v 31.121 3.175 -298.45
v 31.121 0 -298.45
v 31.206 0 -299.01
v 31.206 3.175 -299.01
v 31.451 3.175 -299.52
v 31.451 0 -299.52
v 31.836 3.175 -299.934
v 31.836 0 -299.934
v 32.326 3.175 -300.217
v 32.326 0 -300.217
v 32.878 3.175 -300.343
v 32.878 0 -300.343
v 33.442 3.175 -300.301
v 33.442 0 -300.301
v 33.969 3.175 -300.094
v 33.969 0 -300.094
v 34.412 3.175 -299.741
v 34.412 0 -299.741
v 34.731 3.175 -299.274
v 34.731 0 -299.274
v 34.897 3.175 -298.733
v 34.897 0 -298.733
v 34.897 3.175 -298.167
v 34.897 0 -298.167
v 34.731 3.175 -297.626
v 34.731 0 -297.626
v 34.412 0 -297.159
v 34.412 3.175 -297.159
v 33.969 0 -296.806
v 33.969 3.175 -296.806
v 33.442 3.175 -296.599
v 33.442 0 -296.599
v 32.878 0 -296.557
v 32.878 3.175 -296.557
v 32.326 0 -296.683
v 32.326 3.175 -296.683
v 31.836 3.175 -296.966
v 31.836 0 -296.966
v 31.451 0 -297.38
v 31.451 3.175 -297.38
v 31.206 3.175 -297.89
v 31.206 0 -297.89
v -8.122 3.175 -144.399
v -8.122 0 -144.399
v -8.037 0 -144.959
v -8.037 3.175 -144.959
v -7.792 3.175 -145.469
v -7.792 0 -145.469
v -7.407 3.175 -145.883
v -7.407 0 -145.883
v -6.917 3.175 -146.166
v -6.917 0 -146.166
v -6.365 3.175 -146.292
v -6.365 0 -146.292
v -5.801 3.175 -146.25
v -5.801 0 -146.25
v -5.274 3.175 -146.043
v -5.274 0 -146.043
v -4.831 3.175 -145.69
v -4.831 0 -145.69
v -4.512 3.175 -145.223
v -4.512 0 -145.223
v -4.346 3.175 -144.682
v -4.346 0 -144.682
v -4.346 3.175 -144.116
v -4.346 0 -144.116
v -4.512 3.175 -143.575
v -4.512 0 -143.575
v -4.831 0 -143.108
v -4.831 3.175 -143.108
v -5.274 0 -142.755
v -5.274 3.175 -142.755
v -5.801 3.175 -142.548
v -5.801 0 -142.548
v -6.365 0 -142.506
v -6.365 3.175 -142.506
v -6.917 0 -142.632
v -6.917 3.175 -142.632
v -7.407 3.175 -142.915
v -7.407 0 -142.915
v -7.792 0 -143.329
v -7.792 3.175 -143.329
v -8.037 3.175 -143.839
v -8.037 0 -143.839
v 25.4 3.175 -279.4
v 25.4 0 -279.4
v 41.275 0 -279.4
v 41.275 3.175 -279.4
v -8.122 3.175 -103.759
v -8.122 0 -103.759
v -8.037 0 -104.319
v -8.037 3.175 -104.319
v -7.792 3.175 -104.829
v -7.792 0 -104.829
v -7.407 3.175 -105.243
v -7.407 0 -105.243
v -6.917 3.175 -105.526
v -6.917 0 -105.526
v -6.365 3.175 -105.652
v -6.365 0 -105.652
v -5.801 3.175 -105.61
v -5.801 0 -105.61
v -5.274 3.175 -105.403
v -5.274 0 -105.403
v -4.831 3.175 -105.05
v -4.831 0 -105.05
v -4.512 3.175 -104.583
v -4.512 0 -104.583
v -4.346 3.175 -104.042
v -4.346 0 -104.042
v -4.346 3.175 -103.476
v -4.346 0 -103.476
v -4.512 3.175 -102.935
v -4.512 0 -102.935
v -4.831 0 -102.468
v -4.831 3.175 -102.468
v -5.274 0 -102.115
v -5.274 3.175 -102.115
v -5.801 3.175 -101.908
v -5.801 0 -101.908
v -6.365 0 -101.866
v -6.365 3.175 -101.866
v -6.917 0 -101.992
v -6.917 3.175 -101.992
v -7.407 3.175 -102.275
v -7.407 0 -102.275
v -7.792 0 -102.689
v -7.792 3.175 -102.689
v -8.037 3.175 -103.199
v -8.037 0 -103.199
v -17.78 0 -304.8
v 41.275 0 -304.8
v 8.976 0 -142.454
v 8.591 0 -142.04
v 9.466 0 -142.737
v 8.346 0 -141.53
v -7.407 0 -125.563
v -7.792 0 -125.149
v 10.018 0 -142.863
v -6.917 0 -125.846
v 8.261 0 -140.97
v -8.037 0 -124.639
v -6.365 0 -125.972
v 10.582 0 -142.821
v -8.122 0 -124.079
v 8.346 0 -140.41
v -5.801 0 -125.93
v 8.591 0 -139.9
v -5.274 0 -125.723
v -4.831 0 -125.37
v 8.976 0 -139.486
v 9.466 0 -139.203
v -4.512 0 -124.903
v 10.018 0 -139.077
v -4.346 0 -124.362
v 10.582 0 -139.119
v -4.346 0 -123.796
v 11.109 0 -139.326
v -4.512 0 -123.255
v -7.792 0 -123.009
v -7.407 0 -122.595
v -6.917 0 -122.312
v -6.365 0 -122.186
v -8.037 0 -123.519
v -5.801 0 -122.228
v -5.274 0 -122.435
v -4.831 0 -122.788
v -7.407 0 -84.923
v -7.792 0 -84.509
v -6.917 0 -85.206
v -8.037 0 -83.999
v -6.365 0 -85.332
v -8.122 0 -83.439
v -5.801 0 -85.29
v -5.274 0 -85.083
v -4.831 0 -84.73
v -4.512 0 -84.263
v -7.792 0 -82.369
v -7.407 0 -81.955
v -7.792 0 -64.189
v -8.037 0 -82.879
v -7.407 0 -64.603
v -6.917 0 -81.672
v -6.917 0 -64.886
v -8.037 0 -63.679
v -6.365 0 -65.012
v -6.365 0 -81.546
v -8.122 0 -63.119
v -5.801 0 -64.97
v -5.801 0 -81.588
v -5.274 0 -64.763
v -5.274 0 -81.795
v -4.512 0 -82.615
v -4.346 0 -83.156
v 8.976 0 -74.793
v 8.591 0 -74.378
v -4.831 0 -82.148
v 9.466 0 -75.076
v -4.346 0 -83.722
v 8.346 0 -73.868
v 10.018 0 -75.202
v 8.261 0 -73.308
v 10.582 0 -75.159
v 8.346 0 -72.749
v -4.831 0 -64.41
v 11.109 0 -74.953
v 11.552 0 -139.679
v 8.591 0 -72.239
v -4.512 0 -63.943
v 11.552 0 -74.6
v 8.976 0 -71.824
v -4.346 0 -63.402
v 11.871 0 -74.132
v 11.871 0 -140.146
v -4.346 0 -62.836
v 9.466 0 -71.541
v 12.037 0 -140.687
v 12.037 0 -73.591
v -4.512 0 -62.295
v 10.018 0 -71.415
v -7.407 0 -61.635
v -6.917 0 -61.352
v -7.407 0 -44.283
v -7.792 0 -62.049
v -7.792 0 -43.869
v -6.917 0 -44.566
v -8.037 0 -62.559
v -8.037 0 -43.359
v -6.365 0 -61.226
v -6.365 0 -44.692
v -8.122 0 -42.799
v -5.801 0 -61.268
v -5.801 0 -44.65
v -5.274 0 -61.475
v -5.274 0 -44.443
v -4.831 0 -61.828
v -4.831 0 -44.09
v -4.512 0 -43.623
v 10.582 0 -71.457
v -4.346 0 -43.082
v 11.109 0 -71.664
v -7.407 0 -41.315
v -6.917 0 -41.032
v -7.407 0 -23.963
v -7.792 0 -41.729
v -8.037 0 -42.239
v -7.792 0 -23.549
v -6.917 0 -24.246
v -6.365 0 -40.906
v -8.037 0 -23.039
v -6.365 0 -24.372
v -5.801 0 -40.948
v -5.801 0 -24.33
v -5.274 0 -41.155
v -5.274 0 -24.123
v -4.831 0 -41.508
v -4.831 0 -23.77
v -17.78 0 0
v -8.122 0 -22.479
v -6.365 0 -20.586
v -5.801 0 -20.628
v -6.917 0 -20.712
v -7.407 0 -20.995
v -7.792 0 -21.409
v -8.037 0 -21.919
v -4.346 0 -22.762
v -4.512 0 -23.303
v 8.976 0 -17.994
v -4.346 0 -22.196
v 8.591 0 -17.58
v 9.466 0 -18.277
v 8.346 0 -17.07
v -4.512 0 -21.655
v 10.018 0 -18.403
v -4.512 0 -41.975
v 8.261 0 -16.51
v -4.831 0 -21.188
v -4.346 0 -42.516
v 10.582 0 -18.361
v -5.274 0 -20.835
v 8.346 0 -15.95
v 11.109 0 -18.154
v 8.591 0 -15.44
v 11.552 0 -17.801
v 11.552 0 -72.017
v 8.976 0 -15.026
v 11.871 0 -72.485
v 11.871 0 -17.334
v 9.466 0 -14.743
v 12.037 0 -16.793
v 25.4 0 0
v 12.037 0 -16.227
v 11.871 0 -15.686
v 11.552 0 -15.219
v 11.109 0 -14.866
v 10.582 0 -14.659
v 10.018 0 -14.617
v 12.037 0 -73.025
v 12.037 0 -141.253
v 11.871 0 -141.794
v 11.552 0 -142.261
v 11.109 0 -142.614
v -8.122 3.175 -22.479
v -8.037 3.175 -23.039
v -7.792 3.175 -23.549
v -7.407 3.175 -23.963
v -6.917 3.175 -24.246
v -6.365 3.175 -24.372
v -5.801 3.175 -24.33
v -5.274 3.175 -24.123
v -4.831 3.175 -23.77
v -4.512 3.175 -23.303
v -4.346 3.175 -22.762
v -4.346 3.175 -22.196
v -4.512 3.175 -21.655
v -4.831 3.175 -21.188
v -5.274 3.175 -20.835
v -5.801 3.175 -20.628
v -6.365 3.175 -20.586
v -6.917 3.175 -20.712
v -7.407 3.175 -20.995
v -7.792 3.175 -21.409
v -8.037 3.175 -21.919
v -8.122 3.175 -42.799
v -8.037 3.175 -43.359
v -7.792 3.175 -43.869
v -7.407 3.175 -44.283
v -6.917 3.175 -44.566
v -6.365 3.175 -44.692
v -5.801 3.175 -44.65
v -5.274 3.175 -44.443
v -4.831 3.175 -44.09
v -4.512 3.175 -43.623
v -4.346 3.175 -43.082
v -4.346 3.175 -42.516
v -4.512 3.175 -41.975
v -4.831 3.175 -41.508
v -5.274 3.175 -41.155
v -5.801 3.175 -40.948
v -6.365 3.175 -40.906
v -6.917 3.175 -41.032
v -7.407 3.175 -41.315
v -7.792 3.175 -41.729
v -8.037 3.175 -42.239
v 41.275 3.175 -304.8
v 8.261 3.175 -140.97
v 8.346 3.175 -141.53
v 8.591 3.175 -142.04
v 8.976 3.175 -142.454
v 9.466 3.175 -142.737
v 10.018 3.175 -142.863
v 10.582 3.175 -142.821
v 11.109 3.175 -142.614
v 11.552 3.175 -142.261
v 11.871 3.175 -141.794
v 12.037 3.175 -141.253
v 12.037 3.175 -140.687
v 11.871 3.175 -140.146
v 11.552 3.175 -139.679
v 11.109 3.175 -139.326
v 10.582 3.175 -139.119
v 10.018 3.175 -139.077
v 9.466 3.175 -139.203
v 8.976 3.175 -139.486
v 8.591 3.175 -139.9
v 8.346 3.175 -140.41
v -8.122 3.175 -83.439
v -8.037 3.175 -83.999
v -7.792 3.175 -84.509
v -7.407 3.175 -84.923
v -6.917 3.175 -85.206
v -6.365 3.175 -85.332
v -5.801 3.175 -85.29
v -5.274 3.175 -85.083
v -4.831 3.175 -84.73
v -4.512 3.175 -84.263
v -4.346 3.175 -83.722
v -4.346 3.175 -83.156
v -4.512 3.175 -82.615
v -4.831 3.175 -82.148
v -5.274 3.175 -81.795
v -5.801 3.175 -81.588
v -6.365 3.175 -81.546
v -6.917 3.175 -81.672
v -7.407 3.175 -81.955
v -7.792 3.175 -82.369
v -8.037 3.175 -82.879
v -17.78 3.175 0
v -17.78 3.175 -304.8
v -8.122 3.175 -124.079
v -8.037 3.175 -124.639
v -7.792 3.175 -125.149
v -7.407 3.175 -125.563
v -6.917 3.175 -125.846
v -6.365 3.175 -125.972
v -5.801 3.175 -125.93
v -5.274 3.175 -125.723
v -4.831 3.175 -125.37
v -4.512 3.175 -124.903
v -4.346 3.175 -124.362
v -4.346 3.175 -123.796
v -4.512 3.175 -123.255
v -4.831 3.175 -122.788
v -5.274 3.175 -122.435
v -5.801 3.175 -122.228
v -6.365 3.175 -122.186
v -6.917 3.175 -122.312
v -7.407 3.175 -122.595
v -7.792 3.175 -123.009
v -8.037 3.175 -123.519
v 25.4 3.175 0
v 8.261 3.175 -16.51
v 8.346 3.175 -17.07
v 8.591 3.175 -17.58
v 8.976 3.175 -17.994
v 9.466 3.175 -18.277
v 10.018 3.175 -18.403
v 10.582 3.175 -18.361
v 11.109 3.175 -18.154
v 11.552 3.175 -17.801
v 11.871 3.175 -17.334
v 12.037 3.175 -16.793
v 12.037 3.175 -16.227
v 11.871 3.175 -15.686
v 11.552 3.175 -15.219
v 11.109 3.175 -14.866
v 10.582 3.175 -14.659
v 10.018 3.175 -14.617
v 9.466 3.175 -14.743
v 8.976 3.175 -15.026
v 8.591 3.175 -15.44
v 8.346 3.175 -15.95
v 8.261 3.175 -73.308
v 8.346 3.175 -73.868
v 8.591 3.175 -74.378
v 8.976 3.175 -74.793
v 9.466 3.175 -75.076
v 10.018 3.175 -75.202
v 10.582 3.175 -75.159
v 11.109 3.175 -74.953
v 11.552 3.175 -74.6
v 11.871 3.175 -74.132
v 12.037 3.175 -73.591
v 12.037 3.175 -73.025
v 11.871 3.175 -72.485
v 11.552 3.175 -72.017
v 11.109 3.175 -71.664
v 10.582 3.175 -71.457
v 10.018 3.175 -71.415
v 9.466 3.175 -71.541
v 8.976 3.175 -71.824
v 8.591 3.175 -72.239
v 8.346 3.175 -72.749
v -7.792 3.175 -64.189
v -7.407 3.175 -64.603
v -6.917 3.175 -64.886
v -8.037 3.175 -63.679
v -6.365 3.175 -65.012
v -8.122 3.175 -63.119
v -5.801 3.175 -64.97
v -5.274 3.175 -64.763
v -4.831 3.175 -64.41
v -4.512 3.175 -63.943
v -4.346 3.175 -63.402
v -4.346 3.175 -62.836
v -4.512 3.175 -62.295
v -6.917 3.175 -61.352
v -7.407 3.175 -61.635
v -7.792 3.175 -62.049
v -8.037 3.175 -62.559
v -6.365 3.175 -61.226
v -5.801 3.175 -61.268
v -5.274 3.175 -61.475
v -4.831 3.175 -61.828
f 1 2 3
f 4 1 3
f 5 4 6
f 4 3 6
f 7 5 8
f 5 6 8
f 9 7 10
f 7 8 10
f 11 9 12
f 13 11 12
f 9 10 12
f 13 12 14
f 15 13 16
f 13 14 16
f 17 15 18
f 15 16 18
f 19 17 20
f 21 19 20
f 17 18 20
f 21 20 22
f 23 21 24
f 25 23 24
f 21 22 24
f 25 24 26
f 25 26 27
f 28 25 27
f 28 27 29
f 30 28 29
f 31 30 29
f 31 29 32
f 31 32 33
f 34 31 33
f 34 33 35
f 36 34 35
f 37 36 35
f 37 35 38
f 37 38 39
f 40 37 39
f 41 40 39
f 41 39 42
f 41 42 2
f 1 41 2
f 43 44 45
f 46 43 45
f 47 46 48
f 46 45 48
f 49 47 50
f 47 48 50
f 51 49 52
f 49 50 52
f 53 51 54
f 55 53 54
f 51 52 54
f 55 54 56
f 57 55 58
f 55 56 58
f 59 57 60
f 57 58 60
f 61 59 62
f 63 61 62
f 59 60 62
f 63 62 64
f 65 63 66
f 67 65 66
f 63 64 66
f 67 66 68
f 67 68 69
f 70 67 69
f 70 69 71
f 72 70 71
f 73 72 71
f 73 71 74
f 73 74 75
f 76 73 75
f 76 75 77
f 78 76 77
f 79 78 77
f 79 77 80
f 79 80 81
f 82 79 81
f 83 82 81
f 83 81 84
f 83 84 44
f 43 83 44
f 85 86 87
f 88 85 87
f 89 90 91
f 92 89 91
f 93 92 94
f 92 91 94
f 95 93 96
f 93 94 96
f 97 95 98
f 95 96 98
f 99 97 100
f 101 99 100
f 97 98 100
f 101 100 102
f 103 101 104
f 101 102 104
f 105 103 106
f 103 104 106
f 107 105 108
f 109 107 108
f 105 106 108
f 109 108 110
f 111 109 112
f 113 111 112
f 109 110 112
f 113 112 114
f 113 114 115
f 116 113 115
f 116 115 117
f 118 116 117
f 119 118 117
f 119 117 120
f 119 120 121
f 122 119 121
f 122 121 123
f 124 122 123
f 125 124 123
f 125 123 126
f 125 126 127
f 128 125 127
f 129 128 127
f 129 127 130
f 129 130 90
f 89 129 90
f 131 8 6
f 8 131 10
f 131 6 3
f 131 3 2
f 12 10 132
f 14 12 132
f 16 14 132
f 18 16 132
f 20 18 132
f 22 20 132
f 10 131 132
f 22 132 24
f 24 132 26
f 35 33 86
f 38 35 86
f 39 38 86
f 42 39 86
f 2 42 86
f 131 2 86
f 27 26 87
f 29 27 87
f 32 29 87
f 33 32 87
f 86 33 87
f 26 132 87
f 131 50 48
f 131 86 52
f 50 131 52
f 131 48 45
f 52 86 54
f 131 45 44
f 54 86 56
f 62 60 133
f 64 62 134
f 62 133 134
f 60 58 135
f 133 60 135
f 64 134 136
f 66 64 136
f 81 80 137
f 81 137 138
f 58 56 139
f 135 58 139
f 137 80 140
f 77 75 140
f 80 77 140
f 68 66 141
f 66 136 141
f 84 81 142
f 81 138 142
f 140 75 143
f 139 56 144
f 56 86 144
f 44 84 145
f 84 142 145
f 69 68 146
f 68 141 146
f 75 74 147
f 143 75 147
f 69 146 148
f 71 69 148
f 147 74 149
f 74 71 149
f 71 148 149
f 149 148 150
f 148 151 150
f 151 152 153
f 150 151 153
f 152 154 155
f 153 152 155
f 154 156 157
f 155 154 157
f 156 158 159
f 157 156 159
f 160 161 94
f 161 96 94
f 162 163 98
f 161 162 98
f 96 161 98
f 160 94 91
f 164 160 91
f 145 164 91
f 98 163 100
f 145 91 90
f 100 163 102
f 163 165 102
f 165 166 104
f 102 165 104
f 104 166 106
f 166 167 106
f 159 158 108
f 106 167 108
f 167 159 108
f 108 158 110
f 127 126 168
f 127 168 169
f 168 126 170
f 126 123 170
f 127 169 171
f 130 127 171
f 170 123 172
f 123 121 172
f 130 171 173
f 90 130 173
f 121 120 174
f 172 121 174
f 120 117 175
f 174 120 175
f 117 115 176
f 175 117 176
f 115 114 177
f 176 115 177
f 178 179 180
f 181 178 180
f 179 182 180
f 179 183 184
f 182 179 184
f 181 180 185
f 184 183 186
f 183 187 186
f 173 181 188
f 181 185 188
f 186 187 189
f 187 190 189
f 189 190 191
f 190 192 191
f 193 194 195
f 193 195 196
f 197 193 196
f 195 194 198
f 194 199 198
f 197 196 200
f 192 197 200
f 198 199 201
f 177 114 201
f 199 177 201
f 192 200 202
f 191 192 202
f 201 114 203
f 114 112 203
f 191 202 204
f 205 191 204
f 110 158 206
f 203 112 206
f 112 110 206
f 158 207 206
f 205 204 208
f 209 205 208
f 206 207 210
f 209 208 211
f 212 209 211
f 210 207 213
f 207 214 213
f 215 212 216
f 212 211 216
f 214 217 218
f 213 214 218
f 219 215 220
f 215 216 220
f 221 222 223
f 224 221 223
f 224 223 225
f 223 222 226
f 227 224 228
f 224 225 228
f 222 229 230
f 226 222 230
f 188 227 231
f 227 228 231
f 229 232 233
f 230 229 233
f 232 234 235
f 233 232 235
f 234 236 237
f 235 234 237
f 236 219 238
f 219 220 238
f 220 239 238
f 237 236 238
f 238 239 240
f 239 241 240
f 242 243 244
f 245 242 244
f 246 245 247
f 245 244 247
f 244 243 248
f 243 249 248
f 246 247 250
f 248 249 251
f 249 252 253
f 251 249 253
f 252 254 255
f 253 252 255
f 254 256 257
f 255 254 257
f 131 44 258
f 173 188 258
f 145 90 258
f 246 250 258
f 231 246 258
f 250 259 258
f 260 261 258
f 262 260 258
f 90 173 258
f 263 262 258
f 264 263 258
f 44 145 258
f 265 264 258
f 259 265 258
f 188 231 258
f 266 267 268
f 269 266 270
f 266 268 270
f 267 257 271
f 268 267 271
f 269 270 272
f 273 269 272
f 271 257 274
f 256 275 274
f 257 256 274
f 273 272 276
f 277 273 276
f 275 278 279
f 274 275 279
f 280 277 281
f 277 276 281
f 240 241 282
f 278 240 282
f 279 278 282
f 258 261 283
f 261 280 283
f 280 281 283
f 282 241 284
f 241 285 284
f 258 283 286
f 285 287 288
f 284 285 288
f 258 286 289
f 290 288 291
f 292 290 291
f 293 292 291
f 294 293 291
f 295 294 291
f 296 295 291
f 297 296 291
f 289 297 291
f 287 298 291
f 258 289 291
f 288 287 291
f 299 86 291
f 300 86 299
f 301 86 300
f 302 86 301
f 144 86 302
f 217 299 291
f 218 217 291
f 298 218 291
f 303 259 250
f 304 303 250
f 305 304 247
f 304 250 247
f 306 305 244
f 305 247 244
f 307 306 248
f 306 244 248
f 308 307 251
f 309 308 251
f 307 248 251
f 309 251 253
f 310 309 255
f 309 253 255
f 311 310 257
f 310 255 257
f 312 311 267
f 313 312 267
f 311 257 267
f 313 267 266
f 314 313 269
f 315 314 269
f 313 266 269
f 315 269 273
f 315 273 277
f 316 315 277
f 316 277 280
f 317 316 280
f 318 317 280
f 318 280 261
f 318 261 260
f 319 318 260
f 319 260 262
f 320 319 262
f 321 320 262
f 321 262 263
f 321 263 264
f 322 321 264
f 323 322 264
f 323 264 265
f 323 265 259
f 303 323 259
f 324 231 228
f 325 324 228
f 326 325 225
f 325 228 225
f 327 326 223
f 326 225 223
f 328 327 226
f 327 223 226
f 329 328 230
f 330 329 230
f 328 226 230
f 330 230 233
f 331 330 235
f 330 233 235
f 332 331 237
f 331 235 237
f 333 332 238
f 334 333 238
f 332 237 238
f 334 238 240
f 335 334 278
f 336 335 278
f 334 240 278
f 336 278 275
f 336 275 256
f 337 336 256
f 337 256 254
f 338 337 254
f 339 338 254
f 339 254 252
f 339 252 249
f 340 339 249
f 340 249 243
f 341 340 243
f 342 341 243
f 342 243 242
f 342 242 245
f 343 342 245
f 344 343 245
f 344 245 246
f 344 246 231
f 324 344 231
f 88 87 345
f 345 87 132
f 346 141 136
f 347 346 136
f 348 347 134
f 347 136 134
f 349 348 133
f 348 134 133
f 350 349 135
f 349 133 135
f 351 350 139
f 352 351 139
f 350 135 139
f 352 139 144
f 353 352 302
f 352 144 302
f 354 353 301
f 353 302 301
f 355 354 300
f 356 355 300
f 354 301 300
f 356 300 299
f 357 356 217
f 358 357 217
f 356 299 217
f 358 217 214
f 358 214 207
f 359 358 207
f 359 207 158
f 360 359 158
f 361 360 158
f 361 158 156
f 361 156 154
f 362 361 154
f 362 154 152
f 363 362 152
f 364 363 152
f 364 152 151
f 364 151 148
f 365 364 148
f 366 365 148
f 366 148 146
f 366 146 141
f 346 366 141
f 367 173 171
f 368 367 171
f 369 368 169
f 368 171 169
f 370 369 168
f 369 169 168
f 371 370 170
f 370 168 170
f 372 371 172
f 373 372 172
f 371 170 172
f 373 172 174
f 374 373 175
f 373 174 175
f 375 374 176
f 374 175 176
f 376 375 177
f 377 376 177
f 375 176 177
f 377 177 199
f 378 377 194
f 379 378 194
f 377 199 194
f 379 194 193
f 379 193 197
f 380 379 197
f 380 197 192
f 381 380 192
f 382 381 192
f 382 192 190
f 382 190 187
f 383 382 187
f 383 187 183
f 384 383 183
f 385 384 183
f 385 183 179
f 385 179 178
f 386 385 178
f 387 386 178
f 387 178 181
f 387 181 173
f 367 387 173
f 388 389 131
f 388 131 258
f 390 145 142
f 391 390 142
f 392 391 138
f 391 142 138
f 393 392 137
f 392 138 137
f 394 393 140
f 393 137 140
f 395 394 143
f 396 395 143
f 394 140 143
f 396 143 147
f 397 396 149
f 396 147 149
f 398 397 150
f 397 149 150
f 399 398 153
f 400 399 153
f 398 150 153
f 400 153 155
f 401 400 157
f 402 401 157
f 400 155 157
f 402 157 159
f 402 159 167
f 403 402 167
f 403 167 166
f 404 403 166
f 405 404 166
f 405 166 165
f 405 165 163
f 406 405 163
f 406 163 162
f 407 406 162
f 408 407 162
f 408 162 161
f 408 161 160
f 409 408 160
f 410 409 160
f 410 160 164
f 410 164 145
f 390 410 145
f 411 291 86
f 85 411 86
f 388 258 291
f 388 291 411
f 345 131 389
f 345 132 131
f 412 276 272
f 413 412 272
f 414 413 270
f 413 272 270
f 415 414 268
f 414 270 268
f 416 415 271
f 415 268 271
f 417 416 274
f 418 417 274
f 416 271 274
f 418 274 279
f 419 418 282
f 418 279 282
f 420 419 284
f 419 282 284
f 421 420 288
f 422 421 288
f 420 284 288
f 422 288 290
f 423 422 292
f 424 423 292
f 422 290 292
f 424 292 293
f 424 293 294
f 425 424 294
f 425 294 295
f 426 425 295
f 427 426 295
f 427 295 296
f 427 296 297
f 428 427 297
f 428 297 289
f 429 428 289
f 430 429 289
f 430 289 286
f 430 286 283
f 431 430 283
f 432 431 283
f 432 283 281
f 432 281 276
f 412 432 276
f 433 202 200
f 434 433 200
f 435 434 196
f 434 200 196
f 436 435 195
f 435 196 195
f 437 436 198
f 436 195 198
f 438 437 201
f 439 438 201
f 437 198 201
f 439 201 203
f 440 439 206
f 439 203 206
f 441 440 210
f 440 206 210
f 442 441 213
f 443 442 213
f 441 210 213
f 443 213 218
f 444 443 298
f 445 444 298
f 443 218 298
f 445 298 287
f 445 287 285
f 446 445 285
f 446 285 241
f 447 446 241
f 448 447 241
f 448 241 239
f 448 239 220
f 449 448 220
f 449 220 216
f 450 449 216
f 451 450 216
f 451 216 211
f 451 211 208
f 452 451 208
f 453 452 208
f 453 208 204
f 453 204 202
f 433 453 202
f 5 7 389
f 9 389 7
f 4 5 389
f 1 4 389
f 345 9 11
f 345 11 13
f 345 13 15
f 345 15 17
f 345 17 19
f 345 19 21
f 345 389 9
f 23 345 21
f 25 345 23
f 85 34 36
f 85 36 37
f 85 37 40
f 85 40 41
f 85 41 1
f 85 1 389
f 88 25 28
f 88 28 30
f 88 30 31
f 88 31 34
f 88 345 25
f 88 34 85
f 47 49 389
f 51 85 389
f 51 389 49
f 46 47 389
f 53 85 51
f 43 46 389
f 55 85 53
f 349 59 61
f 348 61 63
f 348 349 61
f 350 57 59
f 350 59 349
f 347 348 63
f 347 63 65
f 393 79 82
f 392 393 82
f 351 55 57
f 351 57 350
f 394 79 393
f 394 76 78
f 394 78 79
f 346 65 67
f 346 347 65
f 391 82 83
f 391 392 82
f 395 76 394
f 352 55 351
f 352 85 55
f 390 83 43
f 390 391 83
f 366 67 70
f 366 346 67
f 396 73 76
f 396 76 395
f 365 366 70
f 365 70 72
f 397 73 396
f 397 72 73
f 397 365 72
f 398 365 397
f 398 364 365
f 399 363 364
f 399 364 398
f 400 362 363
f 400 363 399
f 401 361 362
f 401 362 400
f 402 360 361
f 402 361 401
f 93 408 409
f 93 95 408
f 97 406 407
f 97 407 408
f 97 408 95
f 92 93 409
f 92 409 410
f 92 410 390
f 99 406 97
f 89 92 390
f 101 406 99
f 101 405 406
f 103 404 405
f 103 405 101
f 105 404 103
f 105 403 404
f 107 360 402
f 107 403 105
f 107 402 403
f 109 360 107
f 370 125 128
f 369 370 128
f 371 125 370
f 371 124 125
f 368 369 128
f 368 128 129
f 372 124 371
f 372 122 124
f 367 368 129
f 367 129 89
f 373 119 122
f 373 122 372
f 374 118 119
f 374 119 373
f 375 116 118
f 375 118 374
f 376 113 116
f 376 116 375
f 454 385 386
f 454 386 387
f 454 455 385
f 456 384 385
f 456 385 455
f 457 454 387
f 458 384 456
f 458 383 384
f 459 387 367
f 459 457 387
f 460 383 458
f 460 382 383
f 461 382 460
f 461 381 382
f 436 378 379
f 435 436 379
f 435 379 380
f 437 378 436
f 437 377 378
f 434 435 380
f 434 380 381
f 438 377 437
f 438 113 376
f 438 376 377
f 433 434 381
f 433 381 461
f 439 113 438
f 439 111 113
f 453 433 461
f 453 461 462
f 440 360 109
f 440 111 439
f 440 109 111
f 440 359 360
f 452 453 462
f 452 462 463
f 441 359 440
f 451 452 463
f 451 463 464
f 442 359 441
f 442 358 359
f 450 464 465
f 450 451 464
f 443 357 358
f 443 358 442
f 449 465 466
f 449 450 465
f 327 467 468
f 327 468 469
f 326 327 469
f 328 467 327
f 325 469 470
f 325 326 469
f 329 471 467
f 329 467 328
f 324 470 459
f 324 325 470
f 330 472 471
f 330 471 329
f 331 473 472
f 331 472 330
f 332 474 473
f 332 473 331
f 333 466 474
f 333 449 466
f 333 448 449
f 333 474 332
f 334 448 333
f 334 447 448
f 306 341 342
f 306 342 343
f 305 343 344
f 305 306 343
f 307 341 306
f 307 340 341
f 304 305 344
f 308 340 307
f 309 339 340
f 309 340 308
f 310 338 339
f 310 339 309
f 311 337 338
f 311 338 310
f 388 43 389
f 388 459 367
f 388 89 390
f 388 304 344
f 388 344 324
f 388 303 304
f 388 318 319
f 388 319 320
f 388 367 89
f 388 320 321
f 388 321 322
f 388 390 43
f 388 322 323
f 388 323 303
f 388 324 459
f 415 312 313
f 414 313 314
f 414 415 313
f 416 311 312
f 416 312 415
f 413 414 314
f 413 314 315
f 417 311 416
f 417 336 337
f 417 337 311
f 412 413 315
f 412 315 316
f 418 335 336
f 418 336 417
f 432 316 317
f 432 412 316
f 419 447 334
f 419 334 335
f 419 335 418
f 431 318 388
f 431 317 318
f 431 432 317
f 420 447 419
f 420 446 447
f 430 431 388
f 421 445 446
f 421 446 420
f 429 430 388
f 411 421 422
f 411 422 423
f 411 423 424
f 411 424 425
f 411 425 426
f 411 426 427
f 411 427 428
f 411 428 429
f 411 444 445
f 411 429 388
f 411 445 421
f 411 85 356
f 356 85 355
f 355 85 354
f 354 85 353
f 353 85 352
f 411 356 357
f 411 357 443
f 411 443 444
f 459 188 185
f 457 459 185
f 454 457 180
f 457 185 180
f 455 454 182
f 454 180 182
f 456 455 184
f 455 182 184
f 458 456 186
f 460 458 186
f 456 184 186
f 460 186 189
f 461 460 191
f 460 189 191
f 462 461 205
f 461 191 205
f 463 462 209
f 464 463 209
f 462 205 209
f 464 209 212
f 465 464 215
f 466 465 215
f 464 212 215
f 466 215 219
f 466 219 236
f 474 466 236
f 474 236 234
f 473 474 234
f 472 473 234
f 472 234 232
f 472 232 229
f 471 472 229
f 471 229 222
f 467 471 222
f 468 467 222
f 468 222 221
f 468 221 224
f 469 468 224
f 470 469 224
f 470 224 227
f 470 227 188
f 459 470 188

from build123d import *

# Parameters (mm, degrees)
SKETCH1_W                    = 25.4
SKETCH1_H                    = 25.4
SKETCH1_W_2                  = 15.875
SKETCH1_H_2                  = 279.4
BOSS_EXTRUDE1_DEPTH          = 3.175
F_25_0_1495_DIAMETER_HOLE2_D = 3.7973
SKETCH4_W                    = 304.8
SKETCH4_H                    = 3.175
BOSS_EXTRUDE2_DEPTH          = 17.78
SKETCH5_R                    = 0.127
CUT_EXTRUDE1_DEPTH           = 4.175
F_25_0_1495_DIAMETER_HOLE1_D = 3.7973


with BuildPart() as part:
    # Sketch1 → Boss-Extrude1 (new body)
    with BuildSketch(Plane(origin=(0, 0, 0), x_dir=(1, 0, 0), z_dir=(0, 1, 0))):
        with Locations((12.7, 292.1)):
            Rectangle(SKETCH1_W, SKETCH1_H)
        with Locations((33.3375, 292.1)):
            Rectangle(SKETCH1_W_2, SKETCH1_H)
        with Locations((12.7, 139.7)):
            Rectangle(SKETCH1_W, SKETCH1_H_2)
    extrude(amount=BOSS_EXTRUDE1_DEPTH)

    # #25 (0.1495) Diameter Hole2 (through all)
    with Locations(Plane(origin=(0, 3.175, 0), x_dir=(1, 0, 0), z_dir=(0, 1, 0))):
        with Locations((10.16, 16.51), (10.16, 73.308346978), (10.16, 140.97), (33.02, 298.45)):
            Hole(F_25_0_1495_DIAMETER_HOLE2_D / 2)

    # Sketch4 → Boss-Extrude2 (add)
    with BuildSketch(Plane.ZY):
        with Locations((-152.4, 1.5875)):
            Rectangle(SKETCH4_W, SKETCH4_H)
    extrude(amount=BOSS_EXTRUDE2_DEPTH)

    # Sketch5 → Cut-Extrude1 (cut, through all)
    with BuildSketch(Plane(origin=(0, 3.175, 0), x_dir=(1, 0, 0), z_dir=(0, 1, 0))):
        with Locations((-6.223, 42.799)):
            Circle(SKETCH5_R)
        with Locations((-6.223, 22.479)):
            Circle(SKETCH5_R)
        with Locations((-6.223, 63.119)):
            Circle(SKETCH5_R)
        with Locations((-6.223, 83.439)):
            Circle(SKETCH5_R)
        with Locations((-6.223, 103.759)):
            Circle(SKETCH5_R)
        with Locations((-6.223, 124.079)):
            Circle(SKETCH5_R)
        with Locations((-6.223, 144.399)):
            Circle(SKETCH5_R)
    extrude(amount=-CUT_EXTRUDE1_DEPTH, mode=Mode.SUBTRACT)

    # #25 (0.1495) Diameter Hole1 (through all)
    with Locations(Plane(origin=(0, 3.175, 0), x_dir=(1, 0, 0), z_dir=(0, 1, 0))):
        with Locations((-6.223, 42.799), (-6.223, 63.119), (-6.223, 83.439), (-6.223, 103.759), (-6.223, 124.079), (-6.223, 144.399), (-6.223, 22.479)):
            Hole(F_25_0_1495_DIAMETER_HOLE1_D / 2)


solid = part.part
